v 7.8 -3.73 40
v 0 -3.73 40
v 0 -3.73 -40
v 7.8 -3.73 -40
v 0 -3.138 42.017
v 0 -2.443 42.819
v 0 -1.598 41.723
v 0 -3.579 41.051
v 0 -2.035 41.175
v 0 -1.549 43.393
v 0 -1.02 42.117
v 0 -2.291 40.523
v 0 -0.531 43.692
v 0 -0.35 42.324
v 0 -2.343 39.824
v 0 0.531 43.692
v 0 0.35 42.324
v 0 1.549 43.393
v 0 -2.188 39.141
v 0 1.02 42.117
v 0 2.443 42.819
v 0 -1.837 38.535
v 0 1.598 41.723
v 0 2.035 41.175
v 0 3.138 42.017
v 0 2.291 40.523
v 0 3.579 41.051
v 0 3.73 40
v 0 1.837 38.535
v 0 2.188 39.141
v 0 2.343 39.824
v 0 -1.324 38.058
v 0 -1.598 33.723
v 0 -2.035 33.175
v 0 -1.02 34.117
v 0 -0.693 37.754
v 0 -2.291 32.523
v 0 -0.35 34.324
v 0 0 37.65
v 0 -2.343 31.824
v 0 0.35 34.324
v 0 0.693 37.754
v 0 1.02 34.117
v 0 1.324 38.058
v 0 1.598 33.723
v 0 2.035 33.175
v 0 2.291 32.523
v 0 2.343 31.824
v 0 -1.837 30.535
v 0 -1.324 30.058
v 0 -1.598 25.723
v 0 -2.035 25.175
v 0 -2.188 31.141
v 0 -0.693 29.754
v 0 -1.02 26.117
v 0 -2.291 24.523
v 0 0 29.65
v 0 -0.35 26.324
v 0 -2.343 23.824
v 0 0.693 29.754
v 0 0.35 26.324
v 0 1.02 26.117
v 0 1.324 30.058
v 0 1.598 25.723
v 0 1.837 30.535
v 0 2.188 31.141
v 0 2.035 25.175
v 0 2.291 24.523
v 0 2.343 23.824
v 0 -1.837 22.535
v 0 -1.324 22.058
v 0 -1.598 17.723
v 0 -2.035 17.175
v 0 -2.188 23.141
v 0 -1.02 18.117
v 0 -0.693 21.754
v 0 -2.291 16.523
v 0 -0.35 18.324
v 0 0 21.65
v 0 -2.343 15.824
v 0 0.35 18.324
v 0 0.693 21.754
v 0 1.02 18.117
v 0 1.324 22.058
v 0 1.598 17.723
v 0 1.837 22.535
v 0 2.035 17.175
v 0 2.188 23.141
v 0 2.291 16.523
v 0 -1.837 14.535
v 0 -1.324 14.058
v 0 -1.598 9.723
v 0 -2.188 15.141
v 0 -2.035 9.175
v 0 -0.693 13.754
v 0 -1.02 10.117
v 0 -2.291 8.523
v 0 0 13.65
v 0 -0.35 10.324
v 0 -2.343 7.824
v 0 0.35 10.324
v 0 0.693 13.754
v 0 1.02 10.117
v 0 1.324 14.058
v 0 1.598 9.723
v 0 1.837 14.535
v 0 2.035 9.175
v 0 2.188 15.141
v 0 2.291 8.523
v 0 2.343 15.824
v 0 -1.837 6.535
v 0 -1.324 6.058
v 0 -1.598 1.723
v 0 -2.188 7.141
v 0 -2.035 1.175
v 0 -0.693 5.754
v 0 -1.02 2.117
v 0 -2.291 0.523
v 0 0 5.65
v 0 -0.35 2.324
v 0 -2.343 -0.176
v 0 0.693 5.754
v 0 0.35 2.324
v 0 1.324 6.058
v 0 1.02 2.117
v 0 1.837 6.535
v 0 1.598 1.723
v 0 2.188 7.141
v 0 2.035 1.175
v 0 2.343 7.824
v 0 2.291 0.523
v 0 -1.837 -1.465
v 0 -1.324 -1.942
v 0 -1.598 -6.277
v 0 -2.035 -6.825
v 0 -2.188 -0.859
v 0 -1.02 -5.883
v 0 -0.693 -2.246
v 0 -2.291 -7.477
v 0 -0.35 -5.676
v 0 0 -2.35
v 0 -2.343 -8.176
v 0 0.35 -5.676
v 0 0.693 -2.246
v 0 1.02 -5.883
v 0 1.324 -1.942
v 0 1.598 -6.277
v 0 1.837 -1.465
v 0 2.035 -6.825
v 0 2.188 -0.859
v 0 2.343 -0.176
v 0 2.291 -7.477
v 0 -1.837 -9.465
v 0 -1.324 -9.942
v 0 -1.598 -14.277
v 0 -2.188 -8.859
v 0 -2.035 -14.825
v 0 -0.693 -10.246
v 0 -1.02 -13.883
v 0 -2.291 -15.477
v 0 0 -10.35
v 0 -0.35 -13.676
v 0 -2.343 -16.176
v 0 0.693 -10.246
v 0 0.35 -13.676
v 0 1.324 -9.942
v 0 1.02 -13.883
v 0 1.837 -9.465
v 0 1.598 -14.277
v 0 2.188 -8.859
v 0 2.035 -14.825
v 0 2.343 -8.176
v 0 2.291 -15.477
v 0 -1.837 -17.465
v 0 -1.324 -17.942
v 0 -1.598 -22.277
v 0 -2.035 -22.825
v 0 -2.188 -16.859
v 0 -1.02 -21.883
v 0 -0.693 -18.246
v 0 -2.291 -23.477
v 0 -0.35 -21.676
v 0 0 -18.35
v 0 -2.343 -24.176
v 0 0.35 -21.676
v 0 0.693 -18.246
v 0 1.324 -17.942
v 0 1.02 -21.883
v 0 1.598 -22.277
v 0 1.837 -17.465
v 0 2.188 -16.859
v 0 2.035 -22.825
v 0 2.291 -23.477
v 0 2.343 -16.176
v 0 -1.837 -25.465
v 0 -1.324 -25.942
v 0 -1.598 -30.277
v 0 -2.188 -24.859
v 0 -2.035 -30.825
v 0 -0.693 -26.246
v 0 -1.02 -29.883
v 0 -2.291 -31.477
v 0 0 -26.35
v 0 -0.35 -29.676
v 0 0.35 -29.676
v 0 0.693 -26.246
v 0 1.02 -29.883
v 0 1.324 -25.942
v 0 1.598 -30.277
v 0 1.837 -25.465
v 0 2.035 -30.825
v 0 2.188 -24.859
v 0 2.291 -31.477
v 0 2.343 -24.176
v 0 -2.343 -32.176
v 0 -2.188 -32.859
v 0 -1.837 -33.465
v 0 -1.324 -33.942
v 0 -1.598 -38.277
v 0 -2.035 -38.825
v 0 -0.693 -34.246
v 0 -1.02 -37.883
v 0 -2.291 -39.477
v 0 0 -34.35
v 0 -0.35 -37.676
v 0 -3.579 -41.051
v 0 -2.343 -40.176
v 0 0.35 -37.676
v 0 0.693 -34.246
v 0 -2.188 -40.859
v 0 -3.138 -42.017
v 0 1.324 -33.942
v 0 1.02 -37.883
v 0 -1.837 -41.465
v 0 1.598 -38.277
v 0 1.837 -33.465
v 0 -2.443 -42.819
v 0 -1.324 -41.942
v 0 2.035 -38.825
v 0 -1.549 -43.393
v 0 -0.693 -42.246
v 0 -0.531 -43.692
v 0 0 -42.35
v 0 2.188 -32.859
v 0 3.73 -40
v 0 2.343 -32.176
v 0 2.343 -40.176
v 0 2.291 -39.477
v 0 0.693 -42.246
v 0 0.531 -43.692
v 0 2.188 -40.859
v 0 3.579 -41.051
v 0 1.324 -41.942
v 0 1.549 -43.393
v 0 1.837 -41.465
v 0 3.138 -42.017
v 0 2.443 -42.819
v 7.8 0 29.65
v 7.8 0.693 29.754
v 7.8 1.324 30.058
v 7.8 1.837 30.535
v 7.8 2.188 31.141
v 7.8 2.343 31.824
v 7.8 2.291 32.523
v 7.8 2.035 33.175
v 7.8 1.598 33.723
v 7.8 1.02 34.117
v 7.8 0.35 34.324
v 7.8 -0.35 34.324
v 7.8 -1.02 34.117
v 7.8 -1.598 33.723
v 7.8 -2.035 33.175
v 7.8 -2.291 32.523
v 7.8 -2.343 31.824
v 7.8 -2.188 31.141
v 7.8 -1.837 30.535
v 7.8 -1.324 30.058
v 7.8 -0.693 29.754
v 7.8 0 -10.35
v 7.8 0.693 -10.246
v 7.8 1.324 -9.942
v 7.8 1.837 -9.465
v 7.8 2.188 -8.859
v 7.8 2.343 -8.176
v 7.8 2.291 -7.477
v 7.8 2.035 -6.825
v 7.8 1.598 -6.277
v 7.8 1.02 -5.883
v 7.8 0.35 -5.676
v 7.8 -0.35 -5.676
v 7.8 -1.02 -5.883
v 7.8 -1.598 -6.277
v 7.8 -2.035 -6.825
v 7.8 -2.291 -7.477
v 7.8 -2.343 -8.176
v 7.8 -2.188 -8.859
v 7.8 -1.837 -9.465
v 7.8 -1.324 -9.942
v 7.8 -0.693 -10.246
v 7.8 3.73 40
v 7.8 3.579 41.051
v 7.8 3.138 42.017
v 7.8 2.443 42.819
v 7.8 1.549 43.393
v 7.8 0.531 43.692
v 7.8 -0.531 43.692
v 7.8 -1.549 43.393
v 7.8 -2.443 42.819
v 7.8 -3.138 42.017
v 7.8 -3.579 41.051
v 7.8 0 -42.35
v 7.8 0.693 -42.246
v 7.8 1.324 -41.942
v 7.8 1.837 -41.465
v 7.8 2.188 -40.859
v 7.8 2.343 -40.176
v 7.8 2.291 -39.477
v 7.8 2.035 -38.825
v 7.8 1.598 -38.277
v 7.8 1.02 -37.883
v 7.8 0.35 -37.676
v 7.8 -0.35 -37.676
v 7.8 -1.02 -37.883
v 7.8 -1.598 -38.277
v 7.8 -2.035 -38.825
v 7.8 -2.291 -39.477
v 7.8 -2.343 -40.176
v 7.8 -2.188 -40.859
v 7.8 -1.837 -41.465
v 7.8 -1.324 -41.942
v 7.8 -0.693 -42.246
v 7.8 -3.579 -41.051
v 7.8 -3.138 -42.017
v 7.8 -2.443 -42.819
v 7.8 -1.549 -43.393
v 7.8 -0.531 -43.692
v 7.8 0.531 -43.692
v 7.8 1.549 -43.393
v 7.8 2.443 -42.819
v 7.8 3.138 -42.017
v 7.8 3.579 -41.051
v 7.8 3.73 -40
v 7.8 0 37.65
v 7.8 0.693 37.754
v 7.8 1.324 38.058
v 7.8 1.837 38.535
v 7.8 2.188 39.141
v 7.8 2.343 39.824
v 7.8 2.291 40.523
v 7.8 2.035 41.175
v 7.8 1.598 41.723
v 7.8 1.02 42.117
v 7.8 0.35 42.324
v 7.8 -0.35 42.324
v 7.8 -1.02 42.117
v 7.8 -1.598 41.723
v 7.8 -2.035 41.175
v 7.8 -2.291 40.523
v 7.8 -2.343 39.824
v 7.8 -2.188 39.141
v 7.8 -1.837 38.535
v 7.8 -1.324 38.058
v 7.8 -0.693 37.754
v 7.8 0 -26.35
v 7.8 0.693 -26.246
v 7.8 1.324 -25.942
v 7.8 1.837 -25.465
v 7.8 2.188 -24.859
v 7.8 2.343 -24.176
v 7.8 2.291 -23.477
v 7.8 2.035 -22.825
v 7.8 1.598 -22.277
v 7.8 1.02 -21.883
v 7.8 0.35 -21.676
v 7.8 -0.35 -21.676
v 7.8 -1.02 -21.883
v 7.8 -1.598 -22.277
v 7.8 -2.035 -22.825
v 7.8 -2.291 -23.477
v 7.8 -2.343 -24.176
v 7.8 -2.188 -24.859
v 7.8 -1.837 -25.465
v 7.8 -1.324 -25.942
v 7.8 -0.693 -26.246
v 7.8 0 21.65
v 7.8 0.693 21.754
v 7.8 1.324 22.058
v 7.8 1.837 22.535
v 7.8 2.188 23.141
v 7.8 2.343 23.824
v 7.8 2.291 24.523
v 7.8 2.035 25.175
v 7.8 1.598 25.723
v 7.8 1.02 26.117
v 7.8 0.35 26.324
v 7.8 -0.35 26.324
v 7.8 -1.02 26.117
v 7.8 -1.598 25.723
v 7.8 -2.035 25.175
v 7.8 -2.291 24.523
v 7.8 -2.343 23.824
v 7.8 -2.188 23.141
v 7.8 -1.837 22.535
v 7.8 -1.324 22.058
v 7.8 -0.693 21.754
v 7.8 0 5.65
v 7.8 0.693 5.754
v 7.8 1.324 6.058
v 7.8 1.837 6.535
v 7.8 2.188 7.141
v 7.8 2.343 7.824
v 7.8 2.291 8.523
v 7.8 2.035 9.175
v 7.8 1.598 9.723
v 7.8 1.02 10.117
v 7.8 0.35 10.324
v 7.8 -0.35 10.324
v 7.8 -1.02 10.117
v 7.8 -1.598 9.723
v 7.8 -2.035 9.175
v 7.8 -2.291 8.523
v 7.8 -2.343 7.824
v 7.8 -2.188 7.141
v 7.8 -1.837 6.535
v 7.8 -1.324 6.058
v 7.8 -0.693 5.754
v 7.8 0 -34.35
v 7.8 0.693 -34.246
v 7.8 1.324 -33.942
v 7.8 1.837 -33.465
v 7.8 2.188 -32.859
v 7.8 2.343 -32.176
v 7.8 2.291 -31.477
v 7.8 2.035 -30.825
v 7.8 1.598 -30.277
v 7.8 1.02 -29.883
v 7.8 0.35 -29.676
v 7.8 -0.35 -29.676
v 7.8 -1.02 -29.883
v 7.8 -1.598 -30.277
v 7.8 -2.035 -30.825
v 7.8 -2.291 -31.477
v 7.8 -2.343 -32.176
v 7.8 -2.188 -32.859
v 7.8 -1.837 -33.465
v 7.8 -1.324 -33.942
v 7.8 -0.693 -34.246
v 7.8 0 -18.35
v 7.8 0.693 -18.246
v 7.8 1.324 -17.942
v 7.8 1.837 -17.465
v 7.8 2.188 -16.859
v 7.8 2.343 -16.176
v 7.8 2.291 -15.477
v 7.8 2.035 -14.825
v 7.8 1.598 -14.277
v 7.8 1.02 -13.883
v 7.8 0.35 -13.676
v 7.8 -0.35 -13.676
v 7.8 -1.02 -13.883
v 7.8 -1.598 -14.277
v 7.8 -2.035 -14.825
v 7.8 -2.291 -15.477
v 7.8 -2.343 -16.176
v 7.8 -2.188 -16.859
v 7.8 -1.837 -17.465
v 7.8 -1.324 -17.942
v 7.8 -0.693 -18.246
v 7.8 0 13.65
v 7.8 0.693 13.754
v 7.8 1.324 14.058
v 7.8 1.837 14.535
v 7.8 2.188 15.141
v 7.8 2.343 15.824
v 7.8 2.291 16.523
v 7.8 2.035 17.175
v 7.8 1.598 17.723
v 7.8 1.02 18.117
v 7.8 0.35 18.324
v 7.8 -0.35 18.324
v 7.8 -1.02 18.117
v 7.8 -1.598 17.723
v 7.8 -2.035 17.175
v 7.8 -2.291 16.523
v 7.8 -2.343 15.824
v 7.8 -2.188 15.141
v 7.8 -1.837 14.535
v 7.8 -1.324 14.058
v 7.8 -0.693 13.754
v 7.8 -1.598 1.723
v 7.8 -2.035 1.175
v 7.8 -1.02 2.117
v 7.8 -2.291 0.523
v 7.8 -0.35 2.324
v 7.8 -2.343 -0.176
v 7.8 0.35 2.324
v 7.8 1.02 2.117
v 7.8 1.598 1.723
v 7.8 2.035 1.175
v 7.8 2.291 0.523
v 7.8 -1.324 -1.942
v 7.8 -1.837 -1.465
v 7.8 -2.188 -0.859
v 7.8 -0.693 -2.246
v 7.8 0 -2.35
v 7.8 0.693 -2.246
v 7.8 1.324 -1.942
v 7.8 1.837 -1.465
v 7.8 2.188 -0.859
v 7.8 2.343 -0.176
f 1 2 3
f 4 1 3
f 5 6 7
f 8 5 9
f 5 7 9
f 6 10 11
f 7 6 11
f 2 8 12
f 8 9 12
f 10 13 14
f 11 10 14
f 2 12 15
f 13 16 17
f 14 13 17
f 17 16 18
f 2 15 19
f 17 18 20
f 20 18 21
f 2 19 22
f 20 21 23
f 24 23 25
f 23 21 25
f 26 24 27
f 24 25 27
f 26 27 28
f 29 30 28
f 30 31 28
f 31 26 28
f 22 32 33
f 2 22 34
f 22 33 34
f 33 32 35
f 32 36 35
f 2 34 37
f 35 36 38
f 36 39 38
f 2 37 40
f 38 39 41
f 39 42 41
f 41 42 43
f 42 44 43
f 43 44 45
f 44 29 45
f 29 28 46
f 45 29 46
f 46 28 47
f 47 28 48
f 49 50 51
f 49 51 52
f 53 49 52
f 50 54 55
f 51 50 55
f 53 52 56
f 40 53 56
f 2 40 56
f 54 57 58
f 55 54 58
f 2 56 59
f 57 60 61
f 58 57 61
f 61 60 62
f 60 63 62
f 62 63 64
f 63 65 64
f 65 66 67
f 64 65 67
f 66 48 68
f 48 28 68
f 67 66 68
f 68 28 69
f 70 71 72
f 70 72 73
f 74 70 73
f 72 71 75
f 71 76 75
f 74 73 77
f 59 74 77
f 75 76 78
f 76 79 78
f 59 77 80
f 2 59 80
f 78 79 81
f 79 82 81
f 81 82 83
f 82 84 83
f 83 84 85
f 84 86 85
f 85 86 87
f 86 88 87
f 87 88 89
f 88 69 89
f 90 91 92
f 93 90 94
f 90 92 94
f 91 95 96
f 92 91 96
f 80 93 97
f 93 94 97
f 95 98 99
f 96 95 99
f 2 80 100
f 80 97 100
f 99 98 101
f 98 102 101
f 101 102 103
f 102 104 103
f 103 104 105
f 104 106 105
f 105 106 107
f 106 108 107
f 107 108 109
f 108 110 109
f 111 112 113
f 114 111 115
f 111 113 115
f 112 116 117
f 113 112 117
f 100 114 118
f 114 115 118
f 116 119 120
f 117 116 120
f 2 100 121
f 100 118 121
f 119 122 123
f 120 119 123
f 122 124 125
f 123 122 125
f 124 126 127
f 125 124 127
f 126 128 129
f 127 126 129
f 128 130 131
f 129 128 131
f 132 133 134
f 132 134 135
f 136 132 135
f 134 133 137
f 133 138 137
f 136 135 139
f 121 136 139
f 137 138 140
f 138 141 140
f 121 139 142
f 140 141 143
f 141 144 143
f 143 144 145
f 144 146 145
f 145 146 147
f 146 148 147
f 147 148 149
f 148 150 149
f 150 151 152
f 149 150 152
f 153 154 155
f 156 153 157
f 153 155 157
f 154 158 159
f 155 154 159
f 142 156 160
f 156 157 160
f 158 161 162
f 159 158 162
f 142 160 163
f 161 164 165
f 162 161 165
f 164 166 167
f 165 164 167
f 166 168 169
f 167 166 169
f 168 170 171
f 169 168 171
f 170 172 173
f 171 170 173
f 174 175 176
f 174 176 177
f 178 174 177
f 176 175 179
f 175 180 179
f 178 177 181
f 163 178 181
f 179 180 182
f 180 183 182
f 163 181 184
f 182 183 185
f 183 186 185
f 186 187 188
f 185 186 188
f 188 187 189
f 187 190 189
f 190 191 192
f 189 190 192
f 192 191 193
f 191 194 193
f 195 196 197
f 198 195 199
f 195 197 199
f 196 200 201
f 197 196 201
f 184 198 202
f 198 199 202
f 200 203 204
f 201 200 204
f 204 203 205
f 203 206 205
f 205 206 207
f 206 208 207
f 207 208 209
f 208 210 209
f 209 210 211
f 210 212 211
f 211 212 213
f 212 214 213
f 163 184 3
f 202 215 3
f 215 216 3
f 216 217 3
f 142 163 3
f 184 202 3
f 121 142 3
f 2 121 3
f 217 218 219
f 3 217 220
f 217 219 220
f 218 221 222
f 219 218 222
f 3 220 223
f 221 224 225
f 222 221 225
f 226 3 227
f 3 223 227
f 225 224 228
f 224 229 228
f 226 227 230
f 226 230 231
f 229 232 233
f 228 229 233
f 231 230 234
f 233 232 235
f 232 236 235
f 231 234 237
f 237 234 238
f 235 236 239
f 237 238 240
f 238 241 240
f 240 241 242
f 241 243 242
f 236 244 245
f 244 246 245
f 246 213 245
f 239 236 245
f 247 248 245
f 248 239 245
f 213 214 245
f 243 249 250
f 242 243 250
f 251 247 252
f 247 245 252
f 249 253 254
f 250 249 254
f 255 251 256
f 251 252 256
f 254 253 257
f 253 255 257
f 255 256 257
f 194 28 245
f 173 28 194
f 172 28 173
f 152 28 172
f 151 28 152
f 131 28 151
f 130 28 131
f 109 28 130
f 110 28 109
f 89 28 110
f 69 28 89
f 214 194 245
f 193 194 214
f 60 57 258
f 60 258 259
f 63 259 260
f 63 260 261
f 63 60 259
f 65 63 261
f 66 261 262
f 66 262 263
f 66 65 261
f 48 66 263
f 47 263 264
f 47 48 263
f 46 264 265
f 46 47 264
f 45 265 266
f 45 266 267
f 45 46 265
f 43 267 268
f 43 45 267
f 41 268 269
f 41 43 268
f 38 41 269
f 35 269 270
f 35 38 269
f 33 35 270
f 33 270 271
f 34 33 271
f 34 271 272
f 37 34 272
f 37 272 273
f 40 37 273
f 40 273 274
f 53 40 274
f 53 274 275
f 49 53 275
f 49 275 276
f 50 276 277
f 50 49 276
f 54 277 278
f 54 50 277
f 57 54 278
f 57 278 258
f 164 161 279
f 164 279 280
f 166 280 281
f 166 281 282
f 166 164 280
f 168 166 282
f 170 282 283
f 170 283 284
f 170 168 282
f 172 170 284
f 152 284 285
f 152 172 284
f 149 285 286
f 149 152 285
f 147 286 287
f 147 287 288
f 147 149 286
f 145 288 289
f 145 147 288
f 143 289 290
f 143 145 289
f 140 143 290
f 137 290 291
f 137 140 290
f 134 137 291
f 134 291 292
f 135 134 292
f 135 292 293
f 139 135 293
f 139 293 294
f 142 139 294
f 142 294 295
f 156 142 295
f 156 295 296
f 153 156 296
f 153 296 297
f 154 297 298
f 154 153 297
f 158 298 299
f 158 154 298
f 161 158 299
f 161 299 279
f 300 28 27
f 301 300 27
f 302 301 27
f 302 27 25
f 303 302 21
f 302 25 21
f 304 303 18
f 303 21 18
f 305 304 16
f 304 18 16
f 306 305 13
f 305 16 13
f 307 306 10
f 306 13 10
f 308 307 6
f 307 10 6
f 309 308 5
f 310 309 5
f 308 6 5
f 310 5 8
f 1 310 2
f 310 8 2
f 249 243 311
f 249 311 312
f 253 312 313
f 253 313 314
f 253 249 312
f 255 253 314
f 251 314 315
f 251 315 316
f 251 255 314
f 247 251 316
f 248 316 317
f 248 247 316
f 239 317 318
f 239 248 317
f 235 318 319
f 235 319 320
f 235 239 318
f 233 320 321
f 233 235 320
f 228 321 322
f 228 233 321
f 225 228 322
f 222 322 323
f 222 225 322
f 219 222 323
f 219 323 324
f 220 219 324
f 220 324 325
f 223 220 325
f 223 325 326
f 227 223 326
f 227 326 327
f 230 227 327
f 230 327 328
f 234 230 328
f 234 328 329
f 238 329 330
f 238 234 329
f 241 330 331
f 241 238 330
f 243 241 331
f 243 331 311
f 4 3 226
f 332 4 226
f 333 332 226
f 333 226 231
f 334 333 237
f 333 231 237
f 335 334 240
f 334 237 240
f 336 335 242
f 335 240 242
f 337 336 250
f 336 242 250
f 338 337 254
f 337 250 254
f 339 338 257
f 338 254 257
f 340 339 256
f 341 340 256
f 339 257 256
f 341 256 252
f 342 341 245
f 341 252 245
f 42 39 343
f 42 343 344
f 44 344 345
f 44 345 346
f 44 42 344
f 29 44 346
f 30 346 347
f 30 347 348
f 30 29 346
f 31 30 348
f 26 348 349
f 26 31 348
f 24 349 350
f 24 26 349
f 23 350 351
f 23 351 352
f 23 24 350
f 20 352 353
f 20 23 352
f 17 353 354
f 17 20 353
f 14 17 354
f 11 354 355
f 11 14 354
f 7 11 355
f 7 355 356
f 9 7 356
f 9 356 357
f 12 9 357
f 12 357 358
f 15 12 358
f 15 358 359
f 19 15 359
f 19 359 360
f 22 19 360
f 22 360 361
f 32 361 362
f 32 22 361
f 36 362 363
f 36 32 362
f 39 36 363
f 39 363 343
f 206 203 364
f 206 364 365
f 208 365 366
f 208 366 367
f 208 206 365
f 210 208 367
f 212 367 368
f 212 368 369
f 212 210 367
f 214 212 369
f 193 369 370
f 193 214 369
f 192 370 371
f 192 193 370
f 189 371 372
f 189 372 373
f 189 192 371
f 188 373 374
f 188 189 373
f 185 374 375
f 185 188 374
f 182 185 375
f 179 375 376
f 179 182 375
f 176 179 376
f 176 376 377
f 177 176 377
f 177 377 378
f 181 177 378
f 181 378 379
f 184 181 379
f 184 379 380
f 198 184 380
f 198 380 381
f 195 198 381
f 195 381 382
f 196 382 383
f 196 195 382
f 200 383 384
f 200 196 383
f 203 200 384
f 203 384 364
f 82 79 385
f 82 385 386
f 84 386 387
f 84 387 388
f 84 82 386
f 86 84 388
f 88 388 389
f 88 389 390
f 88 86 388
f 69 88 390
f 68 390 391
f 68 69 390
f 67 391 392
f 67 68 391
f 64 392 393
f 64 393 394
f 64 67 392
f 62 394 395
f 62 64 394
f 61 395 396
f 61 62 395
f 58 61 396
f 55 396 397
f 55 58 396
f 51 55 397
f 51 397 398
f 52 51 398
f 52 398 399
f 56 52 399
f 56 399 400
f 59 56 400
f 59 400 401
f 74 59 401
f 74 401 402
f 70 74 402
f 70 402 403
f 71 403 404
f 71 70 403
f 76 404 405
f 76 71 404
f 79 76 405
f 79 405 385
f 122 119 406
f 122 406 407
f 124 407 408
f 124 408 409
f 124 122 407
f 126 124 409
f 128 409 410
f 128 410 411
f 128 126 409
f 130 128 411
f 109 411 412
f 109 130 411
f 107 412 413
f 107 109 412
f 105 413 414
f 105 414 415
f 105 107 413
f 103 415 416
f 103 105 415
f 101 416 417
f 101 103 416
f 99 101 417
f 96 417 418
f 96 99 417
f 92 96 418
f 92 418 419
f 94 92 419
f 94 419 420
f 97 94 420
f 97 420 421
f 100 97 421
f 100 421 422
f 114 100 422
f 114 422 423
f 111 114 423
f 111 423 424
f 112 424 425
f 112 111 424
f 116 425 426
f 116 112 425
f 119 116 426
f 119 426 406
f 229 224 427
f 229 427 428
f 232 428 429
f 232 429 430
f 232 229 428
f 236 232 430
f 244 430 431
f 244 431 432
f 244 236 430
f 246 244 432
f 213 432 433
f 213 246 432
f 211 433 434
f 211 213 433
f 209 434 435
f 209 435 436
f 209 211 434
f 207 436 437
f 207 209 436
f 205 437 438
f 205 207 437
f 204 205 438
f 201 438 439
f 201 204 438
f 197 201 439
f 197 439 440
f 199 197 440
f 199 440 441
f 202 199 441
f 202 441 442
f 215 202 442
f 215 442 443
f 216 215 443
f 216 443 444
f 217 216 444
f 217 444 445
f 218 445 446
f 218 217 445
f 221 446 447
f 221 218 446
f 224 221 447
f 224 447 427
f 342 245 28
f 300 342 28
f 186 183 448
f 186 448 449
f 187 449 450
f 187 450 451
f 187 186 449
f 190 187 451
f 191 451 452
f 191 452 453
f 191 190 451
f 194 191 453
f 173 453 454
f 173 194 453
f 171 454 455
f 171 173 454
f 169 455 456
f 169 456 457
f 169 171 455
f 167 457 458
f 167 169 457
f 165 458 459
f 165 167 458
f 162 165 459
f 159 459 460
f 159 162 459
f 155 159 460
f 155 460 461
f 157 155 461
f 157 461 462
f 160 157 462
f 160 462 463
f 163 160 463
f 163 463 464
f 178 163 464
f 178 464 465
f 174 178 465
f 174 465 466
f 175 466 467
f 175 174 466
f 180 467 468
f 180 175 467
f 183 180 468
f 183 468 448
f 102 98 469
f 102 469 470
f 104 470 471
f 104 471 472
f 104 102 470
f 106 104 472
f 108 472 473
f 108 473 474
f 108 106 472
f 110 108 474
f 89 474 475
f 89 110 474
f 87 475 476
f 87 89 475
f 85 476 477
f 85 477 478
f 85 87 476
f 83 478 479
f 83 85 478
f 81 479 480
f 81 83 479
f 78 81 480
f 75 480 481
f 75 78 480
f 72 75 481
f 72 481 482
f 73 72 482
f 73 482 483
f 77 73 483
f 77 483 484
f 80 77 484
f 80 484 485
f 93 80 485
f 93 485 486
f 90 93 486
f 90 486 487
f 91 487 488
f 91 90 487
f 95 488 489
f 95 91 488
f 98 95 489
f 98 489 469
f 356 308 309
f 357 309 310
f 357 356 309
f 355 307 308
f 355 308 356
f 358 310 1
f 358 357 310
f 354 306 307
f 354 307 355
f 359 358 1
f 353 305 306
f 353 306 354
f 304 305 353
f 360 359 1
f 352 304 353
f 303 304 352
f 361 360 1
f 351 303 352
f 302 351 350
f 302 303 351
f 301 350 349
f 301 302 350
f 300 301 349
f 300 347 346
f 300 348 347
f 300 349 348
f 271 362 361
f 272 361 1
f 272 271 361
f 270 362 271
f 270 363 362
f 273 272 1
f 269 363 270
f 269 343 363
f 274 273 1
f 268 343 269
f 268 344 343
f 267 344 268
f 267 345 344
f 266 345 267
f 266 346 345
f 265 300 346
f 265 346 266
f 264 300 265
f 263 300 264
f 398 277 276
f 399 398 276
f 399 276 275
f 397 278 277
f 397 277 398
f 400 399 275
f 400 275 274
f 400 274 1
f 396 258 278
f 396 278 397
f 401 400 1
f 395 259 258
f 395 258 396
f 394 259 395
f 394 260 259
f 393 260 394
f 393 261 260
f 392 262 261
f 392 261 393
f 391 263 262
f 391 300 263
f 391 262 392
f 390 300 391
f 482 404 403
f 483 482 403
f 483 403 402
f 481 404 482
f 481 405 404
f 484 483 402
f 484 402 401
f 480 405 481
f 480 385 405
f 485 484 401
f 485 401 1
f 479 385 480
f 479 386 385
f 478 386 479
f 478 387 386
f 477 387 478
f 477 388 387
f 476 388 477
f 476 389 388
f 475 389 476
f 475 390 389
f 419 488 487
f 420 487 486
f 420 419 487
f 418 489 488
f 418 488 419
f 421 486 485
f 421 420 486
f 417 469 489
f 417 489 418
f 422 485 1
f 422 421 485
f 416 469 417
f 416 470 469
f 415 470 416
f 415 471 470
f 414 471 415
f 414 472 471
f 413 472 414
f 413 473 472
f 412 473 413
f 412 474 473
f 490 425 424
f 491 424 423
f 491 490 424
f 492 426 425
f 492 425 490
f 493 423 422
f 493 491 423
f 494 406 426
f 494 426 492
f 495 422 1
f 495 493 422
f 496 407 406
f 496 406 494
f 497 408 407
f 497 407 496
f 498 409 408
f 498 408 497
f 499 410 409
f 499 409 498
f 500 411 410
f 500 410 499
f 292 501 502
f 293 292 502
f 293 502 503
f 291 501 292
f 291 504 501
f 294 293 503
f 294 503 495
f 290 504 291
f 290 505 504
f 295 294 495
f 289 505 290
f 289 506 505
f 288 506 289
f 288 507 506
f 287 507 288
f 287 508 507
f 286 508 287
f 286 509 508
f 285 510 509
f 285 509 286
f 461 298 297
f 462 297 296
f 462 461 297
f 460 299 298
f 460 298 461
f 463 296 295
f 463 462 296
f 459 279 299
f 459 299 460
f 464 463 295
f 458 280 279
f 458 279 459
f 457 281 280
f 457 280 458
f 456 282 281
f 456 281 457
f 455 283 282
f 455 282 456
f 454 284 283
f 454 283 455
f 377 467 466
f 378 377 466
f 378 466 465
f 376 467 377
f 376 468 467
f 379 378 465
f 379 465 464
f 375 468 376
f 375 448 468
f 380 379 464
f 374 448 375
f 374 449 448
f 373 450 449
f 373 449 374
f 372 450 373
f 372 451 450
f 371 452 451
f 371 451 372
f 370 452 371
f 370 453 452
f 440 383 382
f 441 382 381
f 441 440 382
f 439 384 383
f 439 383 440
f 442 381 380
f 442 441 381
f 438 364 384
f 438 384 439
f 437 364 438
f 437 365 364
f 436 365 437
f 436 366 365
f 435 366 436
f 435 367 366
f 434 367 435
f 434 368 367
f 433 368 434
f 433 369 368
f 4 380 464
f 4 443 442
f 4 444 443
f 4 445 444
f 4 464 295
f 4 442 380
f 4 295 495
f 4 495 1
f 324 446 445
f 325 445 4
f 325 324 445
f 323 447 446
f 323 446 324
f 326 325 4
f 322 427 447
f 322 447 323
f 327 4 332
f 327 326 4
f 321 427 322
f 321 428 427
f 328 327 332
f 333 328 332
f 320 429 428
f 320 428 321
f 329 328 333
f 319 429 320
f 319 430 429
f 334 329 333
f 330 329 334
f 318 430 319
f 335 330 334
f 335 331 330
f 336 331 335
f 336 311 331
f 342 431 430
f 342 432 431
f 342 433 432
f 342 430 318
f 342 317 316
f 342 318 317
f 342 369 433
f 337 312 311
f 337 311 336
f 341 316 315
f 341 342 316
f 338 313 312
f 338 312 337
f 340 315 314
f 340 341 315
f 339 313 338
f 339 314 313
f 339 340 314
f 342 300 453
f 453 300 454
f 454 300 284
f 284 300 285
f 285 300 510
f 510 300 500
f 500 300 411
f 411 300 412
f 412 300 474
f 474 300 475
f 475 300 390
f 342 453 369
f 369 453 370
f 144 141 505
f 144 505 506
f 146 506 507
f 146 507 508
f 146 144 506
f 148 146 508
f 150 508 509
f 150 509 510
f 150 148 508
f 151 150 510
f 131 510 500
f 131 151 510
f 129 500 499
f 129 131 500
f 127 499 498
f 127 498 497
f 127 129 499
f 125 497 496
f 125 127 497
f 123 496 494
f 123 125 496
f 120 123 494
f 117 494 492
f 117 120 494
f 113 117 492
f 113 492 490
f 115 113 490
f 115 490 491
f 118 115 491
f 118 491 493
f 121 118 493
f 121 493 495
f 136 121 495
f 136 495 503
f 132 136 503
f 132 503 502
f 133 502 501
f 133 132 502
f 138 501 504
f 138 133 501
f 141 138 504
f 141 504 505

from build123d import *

# Parameters (mm, degrees)
SKETCH1_R           = 2.35
BOSS_EXTRUDE1_DEPTH = 7.8


with BuildPart() as part:
    # Sketch1 → Boss-Extrude1 (new body)
    with BuildSketch(Plane(origin=(0, 0, 0), x_dir=(0, 0, -1), z_dir=(1, 0, 0))):
        with BuildLine():
            Line((-40, -3.73), (40, -3.73))
            ThreePointArc((40, -3.73), (43.73, 0), (40, 3.73))
            Line((40, 3.73), (-40, 3.73))
            ThreePointArc((-40, 3.73), (-43.73, 0), (-40, -3.73))
        make_face()
        with Locations((-40, 0)):
            Circle(SKETCH1_R, mode=Mode.SUBTRACT)
        with Locations((-32, 0)):
            Circle(SKETCH1_R, mode=Mode.SUBTRACT)
        with Locations((-24, 0)):
            Circle(SKETCH1_R, mode=Mode.SUBTRACT)
        with Locations((-16, 0)):
            Circle(SKETCH1_R, mode=Mode.SUBTRACT)
        with Locations((-8, 0)):
            Circle(SKETCH1_R, mode=Mode.SUBTRACT)
        Circle(SKETCH1_R, mode=Mode.SUBTRACT)
        with Locations((8, 0)):
            Circle(SKETCH1_R, mode=Mode.SUBTRACT)
        with Locations((16, 0)):
            Circle(SKETCH1_R, mode=Mode.SUBTRACT)
        with Locations((24, 0)):
            Circle(SKETCH1_R, mode=Mode.SUBTRACT)
        with Locations((32, 0)):
            Circle(SKETCH1_R, mode=Mode.SUBTRACT)
        with Locations((40, 0)):
            Circle(SKETCH1_R, mode=Mode.SUBTRACT)
    extrude(amount=BOSS_EXTRUDE1_DEPTH)


solid = part.part
